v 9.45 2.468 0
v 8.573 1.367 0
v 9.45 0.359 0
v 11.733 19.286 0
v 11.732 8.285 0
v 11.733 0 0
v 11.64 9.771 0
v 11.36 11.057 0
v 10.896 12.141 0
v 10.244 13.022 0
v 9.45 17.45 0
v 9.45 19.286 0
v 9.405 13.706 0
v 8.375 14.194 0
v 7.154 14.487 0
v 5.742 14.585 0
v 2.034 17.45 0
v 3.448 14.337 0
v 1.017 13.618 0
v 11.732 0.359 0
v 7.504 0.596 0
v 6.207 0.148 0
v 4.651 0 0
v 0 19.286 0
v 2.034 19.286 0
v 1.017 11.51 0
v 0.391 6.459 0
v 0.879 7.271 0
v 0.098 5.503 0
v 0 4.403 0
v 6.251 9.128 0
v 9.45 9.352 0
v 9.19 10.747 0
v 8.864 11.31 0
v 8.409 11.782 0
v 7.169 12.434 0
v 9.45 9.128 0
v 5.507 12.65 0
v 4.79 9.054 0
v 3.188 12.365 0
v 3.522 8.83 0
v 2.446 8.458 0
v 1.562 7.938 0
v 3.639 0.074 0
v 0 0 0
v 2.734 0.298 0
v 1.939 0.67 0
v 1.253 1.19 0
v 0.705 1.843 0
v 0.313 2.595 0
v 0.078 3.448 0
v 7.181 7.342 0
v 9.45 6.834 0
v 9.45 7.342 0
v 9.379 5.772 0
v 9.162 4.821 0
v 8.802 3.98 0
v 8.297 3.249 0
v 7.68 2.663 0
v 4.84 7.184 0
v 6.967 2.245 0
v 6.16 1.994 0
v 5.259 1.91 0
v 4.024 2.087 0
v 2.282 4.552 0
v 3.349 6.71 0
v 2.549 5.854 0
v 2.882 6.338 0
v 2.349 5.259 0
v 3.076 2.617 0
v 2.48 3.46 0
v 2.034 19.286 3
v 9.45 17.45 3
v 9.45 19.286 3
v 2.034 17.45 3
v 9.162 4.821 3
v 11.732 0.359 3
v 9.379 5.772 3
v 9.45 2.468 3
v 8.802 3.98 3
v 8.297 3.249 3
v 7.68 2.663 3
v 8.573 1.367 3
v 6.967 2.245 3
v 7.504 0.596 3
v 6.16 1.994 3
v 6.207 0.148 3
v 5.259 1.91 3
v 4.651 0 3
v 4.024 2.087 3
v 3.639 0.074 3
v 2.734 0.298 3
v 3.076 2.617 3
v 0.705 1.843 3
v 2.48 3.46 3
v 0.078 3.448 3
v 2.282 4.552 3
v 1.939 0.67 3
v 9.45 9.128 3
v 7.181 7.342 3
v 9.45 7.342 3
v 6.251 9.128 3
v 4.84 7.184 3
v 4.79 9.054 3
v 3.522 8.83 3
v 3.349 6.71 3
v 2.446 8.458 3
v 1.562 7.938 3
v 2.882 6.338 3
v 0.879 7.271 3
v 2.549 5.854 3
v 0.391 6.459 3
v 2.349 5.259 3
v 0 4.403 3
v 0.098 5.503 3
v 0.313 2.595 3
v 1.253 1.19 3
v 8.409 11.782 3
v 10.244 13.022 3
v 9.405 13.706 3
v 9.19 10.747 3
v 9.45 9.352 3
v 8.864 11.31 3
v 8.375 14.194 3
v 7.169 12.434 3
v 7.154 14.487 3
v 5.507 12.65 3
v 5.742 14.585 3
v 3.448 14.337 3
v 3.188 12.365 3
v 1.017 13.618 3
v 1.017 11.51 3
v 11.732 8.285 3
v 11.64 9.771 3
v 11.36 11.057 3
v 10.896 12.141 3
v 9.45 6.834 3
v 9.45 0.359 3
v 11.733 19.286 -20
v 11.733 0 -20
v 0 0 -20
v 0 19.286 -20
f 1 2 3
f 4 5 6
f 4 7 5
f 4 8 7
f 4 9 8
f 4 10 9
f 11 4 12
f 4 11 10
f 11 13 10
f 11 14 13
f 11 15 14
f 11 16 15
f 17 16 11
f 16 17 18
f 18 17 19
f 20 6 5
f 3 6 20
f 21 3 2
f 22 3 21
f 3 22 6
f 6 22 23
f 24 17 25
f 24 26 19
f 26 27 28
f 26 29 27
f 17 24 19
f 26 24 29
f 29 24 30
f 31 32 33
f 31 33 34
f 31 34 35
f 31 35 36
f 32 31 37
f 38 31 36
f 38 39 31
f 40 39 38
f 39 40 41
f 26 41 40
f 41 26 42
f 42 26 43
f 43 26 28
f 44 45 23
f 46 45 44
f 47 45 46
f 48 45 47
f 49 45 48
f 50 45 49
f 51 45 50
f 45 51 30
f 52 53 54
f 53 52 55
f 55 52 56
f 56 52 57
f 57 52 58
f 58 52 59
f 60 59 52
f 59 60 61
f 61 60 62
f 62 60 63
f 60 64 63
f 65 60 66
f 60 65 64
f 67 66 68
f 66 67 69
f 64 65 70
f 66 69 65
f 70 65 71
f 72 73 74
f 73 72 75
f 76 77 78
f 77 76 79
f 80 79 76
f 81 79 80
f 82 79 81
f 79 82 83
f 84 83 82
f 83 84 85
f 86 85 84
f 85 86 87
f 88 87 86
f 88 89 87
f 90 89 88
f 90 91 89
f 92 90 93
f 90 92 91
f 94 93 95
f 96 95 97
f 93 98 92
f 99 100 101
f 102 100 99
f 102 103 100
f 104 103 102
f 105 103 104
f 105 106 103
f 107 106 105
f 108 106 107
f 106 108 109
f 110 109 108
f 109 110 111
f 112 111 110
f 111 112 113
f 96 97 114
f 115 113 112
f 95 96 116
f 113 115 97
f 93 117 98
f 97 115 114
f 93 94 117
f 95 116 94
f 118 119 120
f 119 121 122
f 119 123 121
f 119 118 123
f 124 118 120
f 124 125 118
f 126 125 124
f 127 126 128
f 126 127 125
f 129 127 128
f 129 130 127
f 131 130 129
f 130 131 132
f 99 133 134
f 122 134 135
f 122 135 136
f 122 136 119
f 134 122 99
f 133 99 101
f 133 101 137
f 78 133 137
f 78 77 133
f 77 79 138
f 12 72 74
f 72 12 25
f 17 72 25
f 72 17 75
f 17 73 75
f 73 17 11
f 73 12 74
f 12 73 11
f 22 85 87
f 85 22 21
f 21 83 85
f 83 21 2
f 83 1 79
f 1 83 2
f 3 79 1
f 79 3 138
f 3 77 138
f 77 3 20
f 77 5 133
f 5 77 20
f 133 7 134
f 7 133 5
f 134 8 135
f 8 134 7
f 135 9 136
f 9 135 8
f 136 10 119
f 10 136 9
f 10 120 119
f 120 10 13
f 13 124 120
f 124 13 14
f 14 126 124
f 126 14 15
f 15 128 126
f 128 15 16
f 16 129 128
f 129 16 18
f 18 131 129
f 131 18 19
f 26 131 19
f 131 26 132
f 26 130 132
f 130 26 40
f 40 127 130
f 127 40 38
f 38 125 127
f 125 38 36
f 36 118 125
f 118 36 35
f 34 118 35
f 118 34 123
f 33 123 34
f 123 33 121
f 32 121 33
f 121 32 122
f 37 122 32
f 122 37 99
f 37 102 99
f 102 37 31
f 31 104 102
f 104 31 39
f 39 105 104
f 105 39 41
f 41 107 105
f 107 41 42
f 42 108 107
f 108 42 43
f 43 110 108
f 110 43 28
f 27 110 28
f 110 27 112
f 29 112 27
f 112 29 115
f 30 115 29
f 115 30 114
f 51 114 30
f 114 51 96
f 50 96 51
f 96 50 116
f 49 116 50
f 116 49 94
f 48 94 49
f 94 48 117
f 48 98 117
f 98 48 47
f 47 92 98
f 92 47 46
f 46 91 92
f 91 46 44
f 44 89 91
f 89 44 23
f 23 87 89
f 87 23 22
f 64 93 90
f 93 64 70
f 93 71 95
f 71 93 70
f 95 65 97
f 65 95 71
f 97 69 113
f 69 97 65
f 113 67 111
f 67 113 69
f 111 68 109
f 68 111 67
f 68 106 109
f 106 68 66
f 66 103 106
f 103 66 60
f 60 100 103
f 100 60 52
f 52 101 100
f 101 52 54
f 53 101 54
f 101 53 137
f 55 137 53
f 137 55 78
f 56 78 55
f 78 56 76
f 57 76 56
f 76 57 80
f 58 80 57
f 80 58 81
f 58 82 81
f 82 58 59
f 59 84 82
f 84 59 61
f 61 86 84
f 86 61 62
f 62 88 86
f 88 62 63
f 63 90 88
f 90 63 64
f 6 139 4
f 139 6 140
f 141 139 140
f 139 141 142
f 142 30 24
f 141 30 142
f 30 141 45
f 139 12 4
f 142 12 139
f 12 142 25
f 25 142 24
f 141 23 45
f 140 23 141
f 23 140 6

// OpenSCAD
/*First Install this handy inscape plugin
https://en.wikibooks.org/wiki/OpenSCAD_User_Manual/DXF_Extrusion

Inkscape steps
Don't resize the inscape page!  Its internal coordinates are different from
the page coordinates and that will make everything super horrible.

Type your letter on the default page, then align the letter to the lower left
corner
-> save as drawing.dxf in the OpenSCAD DXF format*/
union(){
  linear_extrude(height = 3, center = false, convexity = 200)
  import (file = "drawing.dxf");
  total_width = dxf_dim(file = "drawing.dxf", name = "total_width");
  total_height = dxf_dim(file = "drawing.dxf", name = "total_height");

  translate([0,0,-20]){
      color("magenta"){
      echo(total_width);
      echo(total_height);
      cube(size=[total_width,total_height,20]);
   }
  }
}
